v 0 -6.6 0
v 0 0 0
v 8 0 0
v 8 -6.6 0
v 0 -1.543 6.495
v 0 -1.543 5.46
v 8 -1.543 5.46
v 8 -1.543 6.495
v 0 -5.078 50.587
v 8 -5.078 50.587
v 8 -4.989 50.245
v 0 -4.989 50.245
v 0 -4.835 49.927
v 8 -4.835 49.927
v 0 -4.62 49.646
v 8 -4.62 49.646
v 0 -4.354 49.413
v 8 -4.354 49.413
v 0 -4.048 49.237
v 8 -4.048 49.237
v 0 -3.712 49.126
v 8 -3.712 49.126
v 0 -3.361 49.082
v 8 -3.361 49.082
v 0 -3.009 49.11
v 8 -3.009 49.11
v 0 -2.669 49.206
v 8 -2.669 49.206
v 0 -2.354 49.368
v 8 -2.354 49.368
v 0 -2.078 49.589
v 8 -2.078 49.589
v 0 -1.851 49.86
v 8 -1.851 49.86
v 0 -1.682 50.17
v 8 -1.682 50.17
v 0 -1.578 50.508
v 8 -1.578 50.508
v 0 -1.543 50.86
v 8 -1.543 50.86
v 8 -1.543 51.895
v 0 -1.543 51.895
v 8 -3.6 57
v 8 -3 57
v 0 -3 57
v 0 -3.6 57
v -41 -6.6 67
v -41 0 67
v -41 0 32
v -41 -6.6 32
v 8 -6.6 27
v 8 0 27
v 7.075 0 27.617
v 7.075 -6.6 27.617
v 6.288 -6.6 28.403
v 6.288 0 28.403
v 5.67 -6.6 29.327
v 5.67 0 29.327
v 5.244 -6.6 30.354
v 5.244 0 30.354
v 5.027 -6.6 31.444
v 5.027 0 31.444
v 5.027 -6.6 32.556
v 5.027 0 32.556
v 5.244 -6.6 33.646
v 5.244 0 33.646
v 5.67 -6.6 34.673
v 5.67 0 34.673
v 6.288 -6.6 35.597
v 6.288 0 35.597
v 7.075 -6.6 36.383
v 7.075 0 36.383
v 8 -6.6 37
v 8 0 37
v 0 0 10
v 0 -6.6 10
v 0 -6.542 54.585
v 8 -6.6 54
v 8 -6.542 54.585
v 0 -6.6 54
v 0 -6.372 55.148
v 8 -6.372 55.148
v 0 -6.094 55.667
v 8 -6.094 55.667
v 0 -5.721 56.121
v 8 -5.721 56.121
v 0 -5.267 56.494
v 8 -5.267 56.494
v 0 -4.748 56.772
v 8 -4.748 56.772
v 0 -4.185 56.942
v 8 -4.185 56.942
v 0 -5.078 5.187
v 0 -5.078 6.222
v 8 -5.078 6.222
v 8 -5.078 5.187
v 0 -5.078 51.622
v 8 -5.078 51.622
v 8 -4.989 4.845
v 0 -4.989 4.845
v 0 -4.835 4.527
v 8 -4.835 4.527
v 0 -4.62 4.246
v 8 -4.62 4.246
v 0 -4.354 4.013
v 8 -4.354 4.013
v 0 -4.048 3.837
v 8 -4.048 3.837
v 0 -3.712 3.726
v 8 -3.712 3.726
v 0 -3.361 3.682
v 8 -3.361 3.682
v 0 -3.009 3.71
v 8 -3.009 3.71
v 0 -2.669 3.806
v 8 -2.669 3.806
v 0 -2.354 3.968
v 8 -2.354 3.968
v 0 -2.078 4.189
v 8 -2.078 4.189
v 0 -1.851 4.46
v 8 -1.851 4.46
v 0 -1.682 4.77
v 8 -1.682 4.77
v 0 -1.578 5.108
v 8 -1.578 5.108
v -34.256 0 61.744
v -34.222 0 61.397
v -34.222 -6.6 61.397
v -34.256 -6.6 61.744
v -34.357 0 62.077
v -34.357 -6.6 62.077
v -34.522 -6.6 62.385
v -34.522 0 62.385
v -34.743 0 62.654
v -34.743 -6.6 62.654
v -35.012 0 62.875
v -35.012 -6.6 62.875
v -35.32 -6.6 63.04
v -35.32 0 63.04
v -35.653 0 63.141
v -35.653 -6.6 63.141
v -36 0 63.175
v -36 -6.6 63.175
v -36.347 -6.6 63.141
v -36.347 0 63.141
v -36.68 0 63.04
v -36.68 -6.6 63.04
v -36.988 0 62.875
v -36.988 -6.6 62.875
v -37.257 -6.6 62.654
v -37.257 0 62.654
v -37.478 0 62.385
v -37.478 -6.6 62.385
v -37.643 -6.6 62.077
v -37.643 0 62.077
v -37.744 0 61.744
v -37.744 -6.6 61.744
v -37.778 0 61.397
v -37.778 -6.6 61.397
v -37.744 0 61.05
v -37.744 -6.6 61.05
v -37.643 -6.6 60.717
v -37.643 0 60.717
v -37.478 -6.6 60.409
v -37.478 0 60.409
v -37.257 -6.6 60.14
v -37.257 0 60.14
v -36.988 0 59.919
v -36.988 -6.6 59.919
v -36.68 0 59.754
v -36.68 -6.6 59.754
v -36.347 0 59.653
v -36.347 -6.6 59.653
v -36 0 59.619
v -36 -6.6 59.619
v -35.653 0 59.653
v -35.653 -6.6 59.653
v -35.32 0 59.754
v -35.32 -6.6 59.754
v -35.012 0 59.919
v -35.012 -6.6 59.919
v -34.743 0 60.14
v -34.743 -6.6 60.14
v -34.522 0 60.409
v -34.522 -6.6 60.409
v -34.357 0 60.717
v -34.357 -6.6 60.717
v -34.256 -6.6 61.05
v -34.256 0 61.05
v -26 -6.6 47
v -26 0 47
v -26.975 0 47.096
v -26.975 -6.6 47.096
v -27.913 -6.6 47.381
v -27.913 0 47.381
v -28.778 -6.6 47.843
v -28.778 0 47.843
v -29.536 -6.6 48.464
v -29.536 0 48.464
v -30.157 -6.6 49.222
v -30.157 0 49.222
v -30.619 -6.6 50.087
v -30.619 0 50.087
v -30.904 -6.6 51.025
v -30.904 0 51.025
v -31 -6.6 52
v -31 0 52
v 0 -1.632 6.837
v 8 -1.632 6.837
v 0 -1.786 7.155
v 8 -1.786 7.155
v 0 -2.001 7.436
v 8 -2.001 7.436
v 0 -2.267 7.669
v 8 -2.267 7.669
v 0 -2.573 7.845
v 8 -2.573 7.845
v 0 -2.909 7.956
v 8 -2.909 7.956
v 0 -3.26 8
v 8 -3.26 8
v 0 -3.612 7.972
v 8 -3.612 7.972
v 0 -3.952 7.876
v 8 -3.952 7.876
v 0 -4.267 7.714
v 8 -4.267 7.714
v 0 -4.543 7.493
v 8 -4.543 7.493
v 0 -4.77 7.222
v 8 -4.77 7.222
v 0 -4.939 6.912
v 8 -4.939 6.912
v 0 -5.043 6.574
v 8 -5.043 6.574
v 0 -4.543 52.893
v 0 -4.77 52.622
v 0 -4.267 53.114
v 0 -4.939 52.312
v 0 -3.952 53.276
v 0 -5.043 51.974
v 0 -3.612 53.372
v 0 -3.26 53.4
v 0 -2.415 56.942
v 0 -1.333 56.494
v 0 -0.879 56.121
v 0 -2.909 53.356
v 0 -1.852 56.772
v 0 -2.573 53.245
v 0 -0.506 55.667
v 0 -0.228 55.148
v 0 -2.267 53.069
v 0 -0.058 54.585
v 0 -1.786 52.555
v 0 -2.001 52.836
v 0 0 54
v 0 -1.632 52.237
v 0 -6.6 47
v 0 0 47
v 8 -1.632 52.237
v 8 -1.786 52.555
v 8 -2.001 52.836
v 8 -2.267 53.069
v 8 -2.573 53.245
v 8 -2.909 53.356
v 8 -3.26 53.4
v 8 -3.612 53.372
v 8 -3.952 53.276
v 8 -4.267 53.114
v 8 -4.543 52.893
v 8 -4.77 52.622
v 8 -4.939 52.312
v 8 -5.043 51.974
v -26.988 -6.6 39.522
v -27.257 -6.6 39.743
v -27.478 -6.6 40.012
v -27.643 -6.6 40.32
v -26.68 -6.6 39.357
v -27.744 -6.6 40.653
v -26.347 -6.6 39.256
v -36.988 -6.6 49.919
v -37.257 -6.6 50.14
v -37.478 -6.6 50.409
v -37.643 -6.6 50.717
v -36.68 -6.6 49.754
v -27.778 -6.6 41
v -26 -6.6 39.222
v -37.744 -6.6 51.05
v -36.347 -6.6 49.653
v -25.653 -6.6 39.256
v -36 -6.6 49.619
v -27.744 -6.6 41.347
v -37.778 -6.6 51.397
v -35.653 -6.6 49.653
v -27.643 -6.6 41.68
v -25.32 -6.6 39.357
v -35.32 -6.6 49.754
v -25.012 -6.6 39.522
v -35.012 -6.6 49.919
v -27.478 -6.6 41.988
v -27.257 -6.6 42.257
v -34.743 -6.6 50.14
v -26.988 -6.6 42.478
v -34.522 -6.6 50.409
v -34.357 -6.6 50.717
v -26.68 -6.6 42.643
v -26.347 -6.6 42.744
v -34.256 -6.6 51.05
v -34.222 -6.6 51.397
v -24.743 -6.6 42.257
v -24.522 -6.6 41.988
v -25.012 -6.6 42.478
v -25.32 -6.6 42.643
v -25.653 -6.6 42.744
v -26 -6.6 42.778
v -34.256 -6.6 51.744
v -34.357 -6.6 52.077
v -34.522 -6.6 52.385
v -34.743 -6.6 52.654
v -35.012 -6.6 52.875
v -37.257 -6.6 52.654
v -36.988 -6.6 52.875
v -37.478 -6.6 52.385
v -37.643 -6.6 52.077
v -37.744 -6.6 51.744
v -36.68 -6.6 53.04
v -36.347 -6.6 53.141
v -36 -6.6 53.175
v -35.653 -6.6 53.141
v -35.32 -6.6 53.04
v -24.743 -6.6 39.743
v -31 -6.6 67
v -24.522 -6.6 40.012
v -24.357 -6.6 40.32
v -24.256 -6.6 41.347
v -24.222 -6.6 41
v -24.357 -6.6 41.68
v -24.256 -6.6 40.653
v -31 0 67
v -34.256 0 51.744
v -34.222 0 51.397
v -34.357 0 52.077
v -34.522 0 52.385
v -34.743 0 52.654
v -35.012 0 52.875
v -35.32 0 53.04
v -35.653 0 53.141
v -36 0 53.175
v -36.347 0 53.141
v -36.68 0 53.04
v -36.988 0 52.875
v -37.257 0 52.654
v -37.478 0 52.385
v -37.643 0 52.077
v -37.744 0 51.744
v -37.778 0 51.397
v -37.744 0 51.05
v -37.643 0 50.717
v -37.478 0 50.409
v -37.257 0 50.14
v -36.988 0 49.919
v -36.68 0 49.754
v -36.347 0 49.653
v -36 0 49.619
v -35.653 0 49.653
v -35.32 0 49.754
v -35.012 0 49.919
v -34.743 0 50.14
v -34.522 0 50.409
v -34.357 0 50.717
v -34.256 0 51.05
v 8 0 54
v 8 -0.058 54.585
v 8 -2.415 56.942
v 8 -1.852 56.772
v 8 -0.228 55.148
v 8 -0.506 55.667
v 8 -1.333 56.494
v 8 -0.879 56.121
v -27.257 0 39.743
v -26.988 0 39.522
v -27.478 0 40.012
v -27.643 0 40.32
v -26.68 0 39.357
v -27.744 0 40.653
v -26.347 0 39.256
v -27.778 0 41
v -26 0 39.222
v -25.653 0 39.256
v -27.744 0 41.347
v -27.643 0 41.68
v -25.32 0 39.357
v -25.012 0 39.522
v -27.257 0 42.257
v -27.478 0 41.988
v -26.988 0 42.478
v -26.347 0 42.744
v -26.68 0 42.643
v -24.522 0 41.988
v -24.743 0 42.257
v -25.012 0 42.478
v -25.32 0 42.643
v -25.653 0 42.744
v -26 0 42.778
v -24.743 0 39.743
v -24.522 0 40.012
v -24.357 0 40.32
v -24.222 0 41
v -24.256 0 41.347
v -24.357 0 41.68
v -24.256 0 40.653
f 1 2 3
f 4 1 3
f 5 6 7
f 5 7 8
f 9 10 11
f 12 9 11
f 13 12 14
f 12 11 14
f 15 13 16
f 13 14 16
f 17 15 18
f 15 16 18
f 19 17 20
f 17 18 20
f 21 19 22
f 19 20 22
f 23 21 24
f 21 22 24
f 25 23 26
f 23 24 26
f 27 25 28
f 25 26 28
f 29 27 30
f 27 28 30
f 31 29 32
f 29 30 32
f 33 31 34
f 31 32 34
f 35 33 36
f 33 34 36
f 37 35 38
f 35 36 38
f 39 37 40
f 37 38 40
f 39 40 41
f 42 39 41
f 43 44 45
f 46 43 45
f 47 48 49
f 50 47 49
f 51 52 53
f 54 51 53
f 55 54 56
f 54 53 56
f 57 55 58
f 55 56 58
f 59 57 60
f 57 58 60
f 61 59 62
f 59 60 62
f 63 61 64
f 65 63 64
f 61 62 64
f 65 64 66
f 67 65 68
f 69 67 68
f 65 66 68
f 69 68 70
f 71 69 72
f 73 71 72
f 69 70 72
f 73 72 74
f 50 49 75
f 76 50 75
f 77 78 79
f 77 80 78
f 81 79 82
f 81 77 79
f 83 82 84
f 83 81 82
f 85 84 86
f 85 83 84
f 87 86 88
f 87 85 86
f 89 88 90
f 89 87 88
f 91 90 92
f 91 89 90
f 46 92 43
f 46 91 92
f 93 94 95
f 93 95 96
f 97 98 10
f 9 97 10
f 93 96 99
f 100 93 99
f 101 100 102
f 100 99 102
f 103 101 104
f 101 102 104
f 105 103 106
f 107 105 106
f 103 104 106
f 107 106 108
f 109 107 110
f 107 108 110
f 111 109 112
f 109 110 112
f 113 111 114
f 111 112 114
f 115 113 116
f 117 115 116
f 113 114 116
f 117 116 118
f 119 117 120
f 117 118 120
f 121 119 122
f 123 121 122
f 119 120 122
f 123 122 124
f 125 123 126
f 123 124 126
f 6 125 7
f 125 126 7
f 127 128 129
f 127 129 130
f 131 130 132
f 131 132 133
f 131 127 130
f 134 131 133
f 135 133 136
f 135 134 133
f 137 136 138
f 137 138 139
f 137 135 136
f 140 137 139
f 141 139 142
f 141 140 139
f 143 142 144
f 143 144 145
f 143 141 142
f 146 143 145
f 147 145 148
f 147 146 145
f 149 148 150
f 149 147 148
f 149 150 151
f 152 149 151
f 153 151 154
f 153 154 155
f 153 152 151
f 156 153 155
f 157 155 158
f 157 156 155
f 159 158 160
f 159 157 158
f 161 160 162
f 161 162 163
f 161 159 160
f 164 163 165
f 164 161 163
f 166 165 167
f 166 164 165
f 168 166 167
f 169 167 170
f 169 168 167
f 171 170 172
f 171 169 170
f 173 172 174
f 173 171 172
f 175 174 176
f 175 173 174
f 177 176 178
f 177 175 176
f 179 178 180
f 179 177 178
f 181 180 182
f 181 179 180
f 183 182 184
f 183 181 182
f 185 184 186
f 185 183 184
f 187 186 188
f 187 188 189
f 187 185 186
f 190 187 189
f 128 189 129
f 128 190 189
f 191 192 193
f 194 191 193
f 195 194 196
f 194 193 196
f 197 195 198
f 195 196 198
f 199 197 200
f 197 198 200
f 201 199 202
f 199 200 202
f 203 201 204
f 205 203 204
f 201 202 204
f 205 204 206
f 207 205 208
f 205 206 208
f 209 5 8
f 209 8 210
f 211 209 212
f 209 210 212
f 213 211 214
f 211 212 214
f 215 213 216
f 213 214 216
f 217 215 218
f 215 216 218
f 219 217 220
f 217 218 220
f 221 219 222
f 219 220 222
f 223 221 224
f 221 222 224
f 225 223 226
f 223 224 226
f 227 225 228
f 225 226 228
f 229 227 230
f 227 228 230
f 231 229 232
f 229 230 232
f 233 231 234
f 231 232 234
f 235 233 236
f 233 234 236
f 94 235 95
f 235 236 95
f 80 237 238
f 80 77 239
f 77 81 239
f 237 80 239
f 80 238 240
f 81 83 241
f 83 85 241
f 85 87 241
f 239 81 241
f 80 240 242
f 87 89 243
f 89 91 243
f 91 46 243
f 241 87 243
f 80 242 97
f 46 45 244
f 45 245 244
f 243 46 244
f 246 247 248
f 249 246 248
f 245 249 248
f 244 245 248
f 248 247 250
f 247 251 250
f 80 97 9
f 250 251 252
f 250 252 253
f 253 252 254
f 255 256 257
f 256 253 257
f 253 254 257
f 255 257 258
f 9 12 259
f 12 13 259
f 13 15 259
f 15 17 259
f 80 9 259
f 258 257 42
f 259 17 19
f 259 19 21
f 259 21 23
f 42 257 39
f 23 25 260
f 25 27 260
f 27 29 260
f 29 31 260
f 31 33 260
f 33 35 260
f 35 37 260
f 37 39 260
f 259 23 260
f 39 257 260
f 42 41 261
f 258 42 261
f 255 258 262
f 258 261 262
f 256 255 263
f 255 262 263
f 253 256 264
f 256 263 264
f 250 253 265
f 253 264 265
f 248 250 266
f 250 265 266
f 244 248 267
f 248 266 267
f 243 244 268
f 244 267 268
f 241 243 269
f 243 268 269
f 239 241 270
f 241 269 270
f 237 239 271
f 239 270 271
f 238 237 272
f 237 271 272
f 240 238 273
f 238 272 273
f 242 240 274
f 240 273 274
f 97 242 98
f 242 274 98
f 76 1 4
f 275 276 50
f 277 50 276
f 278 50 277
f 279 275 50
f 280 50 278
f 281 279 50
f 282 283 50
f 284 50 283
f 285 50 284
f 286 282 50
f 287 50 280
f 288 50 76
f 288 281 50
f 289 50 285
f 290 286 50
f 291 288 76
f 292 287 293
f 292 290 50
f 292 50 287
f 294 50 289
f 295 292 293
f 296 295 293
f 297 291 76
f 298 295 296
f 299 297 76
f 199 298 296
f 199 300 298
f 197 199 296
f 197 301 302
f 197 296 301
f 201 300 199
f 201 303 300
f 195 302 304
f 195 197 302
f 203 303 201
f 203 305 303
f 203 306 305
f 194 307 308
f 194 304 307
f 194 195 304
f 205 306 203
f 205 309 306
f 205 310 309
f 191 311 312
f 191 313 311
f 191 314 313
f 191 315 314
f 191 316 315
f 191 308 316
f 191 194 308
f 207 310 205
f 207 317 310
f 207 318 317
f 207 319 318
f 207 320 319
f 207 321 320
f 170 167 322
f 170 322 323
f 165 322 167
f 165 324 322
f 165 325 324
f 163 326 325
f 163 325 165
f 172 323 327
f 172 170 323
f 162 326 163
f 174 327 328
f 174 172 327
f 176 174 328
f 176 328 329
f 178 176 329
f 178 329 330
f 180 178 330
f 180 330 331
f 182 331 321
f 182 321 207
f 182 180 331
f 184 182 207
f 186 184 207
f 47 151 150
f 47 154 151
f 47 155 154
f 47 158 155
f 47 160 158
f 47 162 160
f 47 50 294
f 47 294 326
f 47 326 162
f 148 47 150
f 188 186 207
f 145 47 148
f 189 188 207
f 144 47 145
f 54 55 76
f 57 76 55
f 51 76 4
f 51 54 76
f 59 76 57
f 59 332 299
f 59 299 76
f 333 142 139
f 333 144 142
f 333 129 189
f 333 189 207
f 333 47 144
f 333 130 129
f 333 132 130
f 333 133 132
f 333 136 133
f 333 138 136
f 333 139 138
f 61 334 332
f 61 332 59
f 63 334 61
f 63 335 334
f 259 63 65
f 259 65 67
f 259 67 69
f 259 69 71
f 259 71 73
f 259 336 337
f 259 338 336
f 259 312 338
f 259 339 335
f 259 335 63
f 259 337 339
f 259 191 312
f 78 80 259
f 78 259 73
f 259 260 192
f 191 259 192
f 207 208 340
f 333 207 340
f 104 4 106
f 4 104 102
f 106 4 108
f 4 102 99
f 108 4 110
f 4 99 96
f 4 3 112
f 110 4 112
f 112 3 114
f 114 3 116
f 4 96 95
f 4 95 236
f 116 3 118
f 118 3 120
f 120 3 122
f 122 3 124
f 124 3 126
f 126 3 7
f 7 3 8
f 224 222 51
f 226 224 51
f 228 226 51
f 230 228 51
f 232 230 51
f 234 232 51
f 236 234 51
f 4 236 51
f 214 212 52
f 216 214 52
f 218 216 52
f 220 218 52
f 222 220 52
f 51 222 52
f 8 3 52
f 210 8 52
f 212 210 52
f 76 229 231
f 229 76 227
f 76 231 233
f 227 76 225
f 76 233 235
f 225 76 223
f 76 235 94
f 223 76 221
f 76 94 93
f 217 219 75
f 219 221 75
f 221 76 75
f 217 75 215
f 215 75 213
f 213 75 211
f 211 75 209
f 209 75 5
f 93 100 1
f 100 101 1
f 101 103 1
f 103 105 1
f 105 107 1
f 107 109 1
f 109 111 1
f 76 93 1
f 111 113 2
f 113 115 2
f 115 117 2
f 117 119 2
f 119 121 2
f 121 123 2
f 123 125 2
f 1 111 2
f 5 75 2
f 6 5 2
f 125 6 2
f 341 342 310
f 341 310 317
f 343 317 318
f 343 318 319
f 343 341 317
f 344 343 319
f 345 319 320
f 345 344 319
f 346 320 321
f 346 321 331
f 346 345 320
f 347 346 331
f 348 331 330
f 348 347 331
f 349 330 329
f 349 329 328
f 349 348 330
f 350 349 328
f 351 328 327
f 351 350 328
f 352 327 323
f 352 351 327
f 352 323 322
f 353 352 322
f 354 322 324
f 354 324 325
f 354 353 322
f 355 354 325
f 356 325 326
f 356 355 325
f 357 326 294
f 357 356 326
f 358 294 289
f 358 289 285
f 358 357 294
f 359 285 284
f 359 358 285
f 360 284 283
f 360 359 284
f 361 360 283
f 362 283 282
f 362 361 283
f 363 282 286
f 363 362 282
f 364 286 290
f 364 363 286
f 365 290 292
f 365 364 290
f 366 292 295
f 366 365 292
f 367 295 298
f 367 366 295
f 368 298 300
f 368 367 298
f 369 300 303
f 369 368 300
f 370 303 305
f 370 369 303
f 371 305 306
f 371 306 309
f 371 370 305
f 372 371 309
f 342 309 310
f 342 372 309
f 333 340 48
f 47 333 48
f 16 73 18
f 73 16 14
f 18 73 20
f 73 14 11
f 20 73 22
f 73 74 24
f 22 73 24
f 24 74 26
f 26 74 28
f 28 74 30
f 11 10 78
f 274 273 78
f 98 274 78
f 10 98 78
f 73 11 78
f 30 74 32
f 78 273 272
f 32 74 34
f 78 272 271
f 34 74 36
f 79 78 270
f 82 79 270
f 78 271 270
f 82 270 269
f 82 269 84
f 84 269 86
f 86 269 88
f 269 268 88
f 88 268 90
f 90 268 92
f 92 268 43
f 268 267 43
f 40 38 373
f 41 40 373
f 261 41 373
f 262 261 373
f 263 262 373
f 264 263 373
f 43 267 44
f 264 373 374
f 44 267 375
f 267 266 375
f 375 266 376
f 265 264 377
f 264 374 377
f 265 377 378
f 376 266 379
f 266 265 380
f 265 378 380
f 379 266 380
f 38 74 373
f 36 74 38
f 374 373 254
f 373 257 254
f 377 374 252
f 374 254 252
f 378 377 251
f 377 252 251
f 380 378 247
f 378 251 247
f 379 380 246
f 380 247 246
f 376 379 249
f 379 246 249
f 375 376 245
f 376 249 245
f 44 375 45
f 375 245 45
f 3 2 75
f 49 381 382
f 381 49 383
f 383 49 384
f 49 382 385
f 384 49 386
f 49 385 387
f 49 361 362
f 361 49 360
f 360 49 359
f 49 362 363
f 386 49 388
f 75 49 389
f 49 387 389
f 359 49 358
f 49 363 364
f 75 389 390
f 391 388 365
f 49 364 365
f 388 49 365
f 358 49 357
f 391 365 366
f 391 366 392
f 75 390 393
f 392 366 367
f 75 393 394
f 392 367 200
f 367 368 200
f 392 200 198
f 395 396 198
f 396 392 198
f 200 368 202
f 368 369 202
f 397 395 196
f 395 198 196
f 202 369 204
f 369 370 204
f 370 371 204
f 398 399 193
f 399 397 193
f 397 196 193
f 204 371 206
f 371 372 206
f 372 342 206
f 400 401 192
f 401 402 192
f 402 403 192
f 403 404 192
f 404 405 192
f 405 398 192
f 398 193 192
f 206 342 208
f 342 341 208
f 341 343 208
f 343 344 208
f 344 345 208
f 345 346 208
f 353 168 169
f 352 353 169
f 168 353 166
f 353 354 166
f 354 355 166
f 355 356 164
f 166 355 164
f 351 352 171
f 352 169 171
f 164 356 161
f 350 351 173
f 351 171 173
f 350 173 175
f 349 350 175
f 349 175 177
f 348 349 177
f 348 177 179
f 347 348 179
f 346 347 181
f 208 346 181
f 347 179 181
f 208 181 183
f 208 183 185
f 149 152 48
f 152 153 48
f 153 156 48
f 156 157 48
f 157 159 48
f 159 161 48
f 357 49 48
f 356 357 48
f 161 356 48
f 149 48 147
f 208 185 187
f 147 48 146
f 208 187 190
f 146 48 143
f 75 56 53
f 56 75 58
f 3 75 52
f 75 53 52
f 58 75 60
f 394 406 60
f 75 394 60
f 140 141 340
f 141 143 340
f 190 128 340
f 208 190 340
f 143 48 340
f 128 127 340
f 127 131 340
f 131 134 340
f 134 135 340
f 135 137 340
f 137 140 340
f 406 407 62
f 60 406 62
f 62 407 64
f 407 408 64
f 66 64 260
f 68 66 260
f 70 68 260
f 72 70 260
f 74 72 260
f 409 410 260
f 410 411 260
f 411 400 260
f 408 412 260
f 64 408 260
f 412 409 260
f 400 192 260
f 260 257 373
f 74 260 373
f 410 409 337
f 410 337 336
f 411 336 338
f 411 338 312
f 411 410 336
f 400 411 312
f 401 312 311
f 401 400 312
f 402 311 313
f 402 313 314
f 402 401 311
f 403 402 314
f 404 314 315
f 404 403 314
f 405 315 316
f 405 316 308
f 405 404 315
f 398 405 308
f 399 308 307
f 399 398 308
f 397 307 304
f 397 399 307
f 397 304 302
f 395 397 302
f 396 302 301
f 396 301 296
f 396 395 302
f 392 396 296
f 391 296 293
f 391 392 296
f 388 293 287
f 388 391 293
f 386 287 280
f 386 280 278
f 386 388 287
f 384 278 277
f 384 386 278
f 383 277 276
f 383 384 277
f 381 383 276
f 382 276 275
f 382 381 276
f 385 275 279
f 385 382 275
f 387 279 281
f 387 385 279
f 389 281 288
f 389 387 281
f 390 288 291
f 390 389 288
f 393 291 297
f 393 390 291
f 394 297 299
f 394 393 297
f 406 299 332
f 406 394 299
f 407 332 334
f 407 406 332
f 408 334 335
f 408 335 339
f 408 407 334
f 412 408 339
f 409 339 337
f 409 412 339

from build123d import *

# Parameters (mm, degrees)
F0_R     = 1.778
F1_DEPTH = 6.6
F3_DEPTH = 8
F4_R     = 3


with BuildPart() as f1:
    # F0 (on Front) → F1 (new body)
    with BuildSketch(Plane.XZ):
        with BuildLine():
            Line((0, 10), (0, 0))
            Line((0, 0), (8, 0))
            Line((8, 0), (8, 27))
            ThreePointArc((8, 27), (5, 32), (8, 37))
            Line((8, 37), (8, 57))
            Line((8, 57), (0, 57))
            Line((0, 57), (0, 47))
            Line((0, 47), (-26, 47))
            ThreePointArc((-26, 47), (-29.535534, 48.464466), (-31, 52))
            Line((-31, 52), (-31, 67))
            Line((-31, 67), (-41, 67))
            Line((-41, 67), (-41, 32))
            Line((-41, 32), (0, 10))
        make_face()
        with Locations((-26, 41)):
            Circle(F0_R, mode=Mode.SUBTRACT)
        with Locations((-36, 51.396919)):
            Circle(F0_R, mode=Mode.SUBTRACT)
        with Locations((-36, 61.396919)):
            Circle(F0_R, mode=Mode.SUBTRACT)
    extrude(amount=F1_DEPTH)

    # F2 (on face) → F3 (cut, through all)
    with BuildSketch(Plane.YZ.offset(8)):
        with BuildLine():
            Line((-1.543041, 50.86), (-1.543041, 51.894725))
            ThreePointArc((-1.543041, 51.894725), (-3.436768, 53.394732), (-5.078, 51.622))
            Line((-5.078, 51.622), (-5.078, 50.587275))
            ThreePointArc((-5.078, 50.587275), (-3.184273, 49.087268), (-1.543041, 50.86))
        make_face()
        with BuildLine():
            ThreePointArc((-5.078, 5.187275), (-3.184273, 3.687268), (-1.543041, 5.46))
            Line((-1.543041, 5.46), (-1.543041, 6.494725))
            ThreePointArc((-1.543041, 6.494725), (-3.436768, 7.994732), (-5.078, 6.222))
            Line((-5.078, 6.222), (-5.078, 5.187275))
        make_face()
    extrude(amount=-F3_DEPTH, mode=Mode.SUBTRACT)

    # F4
    f4_edges = [f1.edges().sort_by_distance(p)[0] for p in [
        (4, 0, 57),
        (4, -6.6, 57),
    ]]
    fillet(f4_edges, radius=F4_R)


solid = f1.part
